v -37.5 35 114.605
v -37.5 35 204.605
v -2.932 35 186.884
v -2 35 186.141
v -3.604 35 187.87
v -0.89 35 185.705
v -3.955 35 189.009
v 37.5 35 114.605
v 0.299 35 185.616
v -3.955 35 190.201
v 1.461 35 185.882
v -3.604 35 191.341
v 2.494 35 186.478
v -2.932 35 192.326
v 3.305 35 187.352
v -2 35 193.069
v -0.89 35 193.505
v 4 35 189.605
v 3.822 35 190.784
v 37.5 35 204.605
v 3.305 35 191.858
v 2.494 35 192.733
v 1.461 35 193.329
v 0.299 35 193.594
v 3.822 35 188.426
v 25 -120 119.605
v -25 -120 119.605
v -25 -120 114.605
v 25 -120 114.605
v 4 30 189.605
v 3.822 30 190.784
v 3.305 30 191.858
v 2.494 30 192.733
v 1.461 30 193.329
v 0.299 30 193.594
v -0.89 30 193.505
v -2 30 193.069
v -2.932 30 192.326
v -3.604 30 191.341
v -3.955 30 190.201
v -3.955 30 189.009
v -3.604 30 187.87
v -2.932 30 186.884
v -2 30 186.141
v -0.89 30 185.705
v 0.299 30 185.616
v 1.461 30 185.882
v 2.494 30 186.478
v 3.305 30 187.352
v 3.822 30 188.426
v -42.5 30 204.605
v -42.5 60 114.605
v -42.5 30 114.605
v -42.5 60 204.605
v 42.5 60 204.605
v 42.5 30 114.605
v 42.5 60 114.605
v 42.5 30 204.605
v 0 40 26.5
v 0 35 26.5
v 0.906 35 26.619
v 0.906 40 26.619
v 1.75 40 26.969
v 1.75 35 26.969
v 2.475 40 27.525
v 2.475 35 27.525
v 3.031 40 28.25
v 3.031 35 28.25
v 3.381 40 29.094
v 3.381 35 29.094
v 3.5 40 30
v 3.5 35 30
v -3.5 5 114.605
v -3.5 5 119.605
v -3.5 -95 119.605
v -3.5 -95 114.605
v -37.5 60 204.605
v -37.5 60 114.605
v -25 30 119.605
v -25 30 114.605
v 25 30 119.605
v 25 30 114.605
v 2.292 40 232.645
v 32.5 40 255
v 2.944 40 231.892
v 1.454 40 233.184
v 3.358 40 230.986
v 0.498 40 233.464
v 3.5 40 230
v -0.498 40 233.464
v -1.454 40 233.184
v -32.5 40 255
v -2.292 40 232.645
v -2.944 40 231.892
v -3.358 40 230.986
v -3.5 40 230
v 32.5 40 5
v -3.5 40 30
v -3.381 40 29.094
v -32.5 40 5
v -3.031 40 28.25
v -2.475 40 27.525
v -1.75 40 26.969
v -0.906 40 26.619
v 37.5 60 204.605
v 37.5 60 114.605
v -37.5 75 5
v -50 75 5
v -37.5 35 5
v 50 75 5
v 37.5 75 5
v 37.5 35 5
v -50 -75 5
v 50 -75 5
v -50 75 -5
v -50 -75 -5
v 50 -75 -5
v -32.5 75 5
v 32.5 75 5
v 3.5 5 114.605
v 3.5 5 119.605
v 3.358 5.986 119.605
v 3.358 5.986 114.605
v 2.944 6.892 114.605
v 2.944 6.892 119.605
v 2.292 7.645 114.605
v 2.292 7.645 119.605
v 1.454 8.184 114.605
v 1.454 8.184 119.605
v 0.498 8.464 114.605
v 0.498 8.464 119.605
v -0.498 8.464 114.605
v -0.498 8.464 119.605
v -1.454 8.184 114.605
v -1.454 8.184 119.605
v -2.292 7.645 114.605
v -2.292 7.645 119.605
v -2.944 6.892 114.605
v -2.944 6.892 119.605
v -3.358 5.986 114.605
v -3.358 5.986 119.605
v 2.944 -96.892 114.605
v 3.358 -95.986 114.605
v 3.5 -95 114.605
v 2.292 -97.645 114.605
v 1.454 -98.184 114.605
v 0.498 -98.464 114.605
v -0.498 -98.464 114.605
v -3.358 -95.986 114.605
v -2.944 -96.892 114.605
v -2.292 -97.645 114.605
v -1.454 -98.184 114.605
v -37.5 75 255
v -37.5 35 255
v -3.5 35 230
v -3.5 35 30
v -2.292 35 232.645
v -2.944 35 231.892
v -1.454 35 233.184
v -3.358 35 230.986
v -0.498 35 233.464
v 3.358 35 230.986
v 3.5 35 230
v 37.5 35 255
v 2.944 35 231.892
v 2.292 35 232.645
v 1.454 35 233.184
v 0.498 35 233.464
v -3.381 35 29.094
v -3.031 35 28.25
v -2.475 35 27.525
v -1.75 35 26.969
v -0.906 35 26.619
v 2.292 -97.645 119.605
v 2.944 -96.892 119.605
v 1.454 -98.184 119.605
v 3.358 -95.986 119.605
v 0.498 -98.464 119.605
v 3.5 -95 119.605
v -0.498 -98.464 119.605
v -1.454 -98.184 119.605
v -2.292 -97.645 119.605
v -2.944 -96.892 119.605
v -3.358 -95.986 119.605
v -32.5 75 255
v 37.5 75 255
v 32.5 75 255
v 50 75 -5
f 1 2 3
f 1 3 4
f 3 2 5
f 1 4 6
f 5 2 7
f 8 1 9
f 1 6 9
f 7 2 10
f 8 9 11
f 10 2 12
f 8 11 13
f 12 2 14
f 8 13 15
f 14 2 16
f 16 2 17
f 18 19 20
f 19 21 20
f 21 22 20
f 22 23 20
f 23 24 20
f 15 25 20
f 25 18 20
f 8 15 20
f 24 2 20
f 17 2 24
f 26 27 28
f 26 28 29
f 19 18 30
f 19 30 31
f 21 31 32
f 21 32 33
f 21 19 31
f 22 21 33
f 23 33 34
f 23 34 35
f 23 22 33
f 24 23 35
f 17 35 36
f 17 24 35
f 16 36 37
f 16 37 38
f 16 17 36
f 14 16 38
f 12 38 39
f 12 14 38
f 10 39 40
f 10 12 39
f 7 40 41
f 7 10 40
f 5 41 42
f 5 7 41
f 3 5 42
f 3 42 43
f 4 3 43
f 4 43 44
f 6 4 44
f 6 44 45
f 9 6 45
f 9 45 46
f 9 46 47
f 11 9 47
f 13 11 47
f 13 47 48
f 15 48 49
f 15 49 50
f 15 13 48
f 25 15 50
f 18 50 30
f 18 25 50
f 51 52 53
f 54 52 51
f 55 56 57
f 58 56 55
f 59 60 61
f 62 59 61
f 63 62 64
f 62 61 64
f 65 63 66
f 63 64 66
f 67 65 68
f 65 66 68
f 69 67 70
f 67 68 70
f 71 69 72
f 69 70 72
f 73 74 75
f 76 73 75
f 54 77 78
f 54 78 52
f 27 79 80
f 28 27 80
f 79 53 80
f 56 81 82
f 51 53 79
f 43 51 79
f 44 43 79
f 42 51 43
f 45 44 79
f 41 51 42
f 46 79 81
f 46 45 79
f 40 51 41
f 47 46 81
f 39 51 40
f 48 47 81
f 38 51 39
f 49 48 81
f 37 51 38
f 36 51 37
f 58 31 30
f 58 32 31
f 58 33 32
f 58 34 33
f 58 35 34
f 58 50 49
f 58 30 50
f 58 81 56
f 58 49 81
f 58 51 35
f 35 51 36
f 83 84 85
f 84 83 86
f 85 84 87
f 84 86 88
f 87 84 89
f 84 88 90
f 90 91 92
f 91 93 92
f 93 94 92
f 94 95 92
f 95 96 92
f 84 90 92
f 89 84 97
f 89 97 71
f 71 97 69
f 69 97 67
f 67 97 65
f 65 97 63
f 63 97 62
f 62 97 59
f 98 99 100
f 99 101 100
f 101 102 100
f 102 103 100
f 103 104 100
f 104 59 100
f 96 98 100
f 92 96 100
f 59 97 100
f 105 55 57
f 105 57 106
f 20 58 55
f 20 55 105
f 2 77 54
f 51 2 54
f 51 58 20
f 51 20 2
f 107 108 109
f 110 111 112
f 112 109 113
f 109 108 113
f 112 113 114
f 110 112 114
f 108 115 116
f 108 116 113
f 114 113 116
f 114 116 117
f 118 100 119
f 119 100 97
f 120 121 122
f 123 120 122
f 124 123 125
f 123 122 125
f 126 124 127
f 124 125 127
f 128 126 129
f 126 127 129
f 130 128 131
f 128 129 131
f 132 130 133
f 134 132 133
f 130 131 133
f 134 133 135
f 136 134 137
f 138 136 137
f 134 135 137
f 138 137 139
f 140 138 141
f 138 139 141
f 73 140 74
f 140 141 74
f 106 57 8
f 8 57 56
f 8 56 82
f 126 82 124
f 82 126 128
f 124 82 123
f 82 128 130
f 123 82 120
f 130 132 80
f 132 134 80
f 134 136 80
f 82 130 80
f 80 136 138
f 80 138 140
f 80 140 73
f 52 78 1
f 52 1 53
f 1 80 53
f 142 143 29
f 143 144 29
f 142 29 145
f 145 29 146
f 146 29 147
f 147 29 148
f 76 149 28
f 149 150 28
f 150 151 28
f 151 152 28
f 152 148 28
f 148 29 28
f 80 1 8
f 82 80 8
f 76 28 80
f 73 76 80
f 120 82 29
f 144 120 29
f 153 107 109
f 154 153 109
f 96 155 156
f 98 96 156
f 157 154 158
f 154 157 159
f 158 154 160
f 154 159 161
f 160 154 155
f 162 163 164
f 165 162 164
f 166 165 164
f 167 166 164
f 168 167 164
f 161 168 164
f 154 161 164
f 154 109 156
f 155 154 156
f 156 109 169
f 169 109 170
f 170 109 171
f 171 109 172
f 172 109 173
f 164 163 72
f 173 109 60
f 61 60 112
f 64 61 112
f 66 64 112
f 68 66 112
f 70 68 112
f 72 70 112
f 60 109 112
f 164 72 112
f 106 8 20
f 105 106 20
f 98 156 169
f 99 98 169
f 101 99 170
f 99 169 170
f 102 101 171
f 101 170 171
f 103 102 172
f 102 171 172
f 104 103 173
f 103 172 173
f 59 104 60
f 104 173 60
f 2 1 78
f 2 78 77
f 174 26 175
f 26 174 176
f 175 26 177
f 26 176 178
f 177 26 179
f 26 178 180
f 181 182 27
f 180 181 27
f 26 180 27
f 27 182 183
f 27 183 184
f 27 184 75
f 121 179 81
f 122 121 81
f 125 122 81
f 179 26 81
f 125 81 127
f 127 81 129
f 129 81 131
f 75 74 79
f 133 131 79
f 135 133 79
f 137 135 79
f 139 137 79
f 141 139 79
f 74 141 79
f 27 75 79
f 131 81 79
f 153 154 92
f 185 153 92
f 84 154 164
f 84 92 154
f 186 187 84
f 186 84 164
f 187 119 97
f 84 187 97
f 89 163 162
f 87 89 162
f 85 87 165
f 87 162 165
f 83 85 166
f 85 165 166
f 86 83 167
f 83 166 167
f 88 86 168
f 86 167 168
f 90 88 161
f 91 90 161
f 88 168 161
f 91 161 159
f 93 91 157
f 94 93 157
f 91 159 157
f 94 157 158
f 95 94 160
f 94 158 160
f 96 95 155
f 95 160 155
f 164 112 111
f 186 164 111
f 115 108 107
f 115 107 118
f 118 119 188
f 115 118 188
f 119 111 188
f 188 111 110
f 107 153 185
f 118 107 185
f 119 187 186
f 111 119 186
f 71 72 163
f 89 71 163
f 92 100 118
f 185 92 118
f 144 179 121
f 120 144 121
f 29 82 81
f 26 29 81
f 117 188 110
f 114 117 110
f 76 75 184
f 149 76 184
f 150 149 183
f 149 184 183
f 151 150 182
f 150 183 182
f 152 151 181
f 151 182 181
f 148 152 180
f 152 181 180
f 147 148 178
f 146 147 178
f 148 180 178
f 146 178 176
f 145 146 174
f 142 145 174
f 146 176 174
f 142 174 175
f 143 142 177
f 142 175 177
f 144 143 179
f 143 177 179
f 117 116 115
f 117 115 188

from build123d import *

# Parameters (mm, degrees)
F0_W      = 100
F0_H      = 10
F1_DEPTH  = 75
F3_DEPTH  = 250
F5_DEPTH  = 25
F6_W      = 5
F6_H      = 90
F6_W_2    = 75
F6_R      = 4
F7_DEPTH  = 5
F8_W      = 5
F8_H      = 90
F9_DEPTH  = 25
F11_DEPTH = 150
F13_DEPTH = 25


with BuildPart() as f1:
    # F0 (on Front) → F1 (new body, symmetric)
    with BuildSketch(Plane.XZ):
        Rectangle(F0_W, F0_H)
    extrude(amount=F1_DEPTH, both=True)

    # F2 (on face) → F3 (join)
    with BuildSketch(Plane.XY.offset(5)):
        Polygon((-32.5, 75), (-37.5, 75), (-37.5, 35), (0, 35), (37.5, 35), (37.5, 75), (32.5, 75), (32.5, 40), (-32.5, 40), align=None)
    extrude(amount=F3_DEPTH)

    # F4 (on face) → F5 (cut)
    with BuildSketch(Plane.XZ.offset(-35)):
        with BuildLine():
            ThreePointArc((-3.5, 30), (-2.4748737342, 27.5251262658), (0, 26.5))
            ThreePointArc((0, 26.5), (2.4748737342, 27.5251262658), (3.5, 30))
            Line((3.5, 30), (3.5, 230))
            ThreePointArc((3.5, 230), (0, 233.5), (-3.5, 230))
            Line((-3.5, 230), (-3.5, 30))
        make_face()
    extrude(amount=-F5_DEPTH, mode=Mode.SUBTRACT)


with BuildPart() as f7:
    # F6 (on face) → F7 (new body)
    with BuildSketch(Plane.XZ.offset(-35)):
        with Locations((40, 159.6051809192)):
            Rectangle(F6_W, F6_H)
        with Locations((0, 159.6051809192)):
            Rectangle(F6_W_2, F6_H)
        with Locations((0, 189.6051809192)):
            Circle(F6_R, mode=Mode.SUBTRACT)
        with Locations((-40, 159.6051809192)):
            Rectangle(F6_W, F6_H)
    extrude(amount=F7_DEPTH)

    # F8 (on face) → F9 (join)
    with BuildSketch(Plane(origin=(0, 35, 0), x_dir=(-1, 0, 0), z_dir=(0, 1, 0))):
        with Locations((-40, 159.6051809192)):
            Rectangle(F8_W, F8_H)
        with Locations((40, 159.6051809192)):
            Rectangle(F8_W, F8_H)
    extrude(amount=F9_DEPTH)

    # F10 (on face) → F11 (join)
    with BuildSketch(Plane.XZ.offset(-30)):
        Polygon((25, 119.6051809192), (0, 119.6051809192), (-25, 119.6051809192), (-25, 114.6051809192), (25, 114.6051809192), align=None)
    extrude(amount=F11_DEPTH)

    # F12 (on face) → F13 (cut)
    with BuildSketch(Plane.XY.offset(119.6051809192)):
        with BuildLine():
            ThreePointArc((-3.5, -95), (0, -98.5), (3.5, -95))
            Line((3.5, -95), (3.5, 5))
            ThreePointArc((3.5, 5), (0, 8.5), (-3.5, 5))
            Line((-3.5, 5), (-3.5, -95))
        make_face()
    extrude(amount=-F13_DEPTH, mode=Mode.SUBTRACT)


solid = Compound([f1.part, f7.part])
